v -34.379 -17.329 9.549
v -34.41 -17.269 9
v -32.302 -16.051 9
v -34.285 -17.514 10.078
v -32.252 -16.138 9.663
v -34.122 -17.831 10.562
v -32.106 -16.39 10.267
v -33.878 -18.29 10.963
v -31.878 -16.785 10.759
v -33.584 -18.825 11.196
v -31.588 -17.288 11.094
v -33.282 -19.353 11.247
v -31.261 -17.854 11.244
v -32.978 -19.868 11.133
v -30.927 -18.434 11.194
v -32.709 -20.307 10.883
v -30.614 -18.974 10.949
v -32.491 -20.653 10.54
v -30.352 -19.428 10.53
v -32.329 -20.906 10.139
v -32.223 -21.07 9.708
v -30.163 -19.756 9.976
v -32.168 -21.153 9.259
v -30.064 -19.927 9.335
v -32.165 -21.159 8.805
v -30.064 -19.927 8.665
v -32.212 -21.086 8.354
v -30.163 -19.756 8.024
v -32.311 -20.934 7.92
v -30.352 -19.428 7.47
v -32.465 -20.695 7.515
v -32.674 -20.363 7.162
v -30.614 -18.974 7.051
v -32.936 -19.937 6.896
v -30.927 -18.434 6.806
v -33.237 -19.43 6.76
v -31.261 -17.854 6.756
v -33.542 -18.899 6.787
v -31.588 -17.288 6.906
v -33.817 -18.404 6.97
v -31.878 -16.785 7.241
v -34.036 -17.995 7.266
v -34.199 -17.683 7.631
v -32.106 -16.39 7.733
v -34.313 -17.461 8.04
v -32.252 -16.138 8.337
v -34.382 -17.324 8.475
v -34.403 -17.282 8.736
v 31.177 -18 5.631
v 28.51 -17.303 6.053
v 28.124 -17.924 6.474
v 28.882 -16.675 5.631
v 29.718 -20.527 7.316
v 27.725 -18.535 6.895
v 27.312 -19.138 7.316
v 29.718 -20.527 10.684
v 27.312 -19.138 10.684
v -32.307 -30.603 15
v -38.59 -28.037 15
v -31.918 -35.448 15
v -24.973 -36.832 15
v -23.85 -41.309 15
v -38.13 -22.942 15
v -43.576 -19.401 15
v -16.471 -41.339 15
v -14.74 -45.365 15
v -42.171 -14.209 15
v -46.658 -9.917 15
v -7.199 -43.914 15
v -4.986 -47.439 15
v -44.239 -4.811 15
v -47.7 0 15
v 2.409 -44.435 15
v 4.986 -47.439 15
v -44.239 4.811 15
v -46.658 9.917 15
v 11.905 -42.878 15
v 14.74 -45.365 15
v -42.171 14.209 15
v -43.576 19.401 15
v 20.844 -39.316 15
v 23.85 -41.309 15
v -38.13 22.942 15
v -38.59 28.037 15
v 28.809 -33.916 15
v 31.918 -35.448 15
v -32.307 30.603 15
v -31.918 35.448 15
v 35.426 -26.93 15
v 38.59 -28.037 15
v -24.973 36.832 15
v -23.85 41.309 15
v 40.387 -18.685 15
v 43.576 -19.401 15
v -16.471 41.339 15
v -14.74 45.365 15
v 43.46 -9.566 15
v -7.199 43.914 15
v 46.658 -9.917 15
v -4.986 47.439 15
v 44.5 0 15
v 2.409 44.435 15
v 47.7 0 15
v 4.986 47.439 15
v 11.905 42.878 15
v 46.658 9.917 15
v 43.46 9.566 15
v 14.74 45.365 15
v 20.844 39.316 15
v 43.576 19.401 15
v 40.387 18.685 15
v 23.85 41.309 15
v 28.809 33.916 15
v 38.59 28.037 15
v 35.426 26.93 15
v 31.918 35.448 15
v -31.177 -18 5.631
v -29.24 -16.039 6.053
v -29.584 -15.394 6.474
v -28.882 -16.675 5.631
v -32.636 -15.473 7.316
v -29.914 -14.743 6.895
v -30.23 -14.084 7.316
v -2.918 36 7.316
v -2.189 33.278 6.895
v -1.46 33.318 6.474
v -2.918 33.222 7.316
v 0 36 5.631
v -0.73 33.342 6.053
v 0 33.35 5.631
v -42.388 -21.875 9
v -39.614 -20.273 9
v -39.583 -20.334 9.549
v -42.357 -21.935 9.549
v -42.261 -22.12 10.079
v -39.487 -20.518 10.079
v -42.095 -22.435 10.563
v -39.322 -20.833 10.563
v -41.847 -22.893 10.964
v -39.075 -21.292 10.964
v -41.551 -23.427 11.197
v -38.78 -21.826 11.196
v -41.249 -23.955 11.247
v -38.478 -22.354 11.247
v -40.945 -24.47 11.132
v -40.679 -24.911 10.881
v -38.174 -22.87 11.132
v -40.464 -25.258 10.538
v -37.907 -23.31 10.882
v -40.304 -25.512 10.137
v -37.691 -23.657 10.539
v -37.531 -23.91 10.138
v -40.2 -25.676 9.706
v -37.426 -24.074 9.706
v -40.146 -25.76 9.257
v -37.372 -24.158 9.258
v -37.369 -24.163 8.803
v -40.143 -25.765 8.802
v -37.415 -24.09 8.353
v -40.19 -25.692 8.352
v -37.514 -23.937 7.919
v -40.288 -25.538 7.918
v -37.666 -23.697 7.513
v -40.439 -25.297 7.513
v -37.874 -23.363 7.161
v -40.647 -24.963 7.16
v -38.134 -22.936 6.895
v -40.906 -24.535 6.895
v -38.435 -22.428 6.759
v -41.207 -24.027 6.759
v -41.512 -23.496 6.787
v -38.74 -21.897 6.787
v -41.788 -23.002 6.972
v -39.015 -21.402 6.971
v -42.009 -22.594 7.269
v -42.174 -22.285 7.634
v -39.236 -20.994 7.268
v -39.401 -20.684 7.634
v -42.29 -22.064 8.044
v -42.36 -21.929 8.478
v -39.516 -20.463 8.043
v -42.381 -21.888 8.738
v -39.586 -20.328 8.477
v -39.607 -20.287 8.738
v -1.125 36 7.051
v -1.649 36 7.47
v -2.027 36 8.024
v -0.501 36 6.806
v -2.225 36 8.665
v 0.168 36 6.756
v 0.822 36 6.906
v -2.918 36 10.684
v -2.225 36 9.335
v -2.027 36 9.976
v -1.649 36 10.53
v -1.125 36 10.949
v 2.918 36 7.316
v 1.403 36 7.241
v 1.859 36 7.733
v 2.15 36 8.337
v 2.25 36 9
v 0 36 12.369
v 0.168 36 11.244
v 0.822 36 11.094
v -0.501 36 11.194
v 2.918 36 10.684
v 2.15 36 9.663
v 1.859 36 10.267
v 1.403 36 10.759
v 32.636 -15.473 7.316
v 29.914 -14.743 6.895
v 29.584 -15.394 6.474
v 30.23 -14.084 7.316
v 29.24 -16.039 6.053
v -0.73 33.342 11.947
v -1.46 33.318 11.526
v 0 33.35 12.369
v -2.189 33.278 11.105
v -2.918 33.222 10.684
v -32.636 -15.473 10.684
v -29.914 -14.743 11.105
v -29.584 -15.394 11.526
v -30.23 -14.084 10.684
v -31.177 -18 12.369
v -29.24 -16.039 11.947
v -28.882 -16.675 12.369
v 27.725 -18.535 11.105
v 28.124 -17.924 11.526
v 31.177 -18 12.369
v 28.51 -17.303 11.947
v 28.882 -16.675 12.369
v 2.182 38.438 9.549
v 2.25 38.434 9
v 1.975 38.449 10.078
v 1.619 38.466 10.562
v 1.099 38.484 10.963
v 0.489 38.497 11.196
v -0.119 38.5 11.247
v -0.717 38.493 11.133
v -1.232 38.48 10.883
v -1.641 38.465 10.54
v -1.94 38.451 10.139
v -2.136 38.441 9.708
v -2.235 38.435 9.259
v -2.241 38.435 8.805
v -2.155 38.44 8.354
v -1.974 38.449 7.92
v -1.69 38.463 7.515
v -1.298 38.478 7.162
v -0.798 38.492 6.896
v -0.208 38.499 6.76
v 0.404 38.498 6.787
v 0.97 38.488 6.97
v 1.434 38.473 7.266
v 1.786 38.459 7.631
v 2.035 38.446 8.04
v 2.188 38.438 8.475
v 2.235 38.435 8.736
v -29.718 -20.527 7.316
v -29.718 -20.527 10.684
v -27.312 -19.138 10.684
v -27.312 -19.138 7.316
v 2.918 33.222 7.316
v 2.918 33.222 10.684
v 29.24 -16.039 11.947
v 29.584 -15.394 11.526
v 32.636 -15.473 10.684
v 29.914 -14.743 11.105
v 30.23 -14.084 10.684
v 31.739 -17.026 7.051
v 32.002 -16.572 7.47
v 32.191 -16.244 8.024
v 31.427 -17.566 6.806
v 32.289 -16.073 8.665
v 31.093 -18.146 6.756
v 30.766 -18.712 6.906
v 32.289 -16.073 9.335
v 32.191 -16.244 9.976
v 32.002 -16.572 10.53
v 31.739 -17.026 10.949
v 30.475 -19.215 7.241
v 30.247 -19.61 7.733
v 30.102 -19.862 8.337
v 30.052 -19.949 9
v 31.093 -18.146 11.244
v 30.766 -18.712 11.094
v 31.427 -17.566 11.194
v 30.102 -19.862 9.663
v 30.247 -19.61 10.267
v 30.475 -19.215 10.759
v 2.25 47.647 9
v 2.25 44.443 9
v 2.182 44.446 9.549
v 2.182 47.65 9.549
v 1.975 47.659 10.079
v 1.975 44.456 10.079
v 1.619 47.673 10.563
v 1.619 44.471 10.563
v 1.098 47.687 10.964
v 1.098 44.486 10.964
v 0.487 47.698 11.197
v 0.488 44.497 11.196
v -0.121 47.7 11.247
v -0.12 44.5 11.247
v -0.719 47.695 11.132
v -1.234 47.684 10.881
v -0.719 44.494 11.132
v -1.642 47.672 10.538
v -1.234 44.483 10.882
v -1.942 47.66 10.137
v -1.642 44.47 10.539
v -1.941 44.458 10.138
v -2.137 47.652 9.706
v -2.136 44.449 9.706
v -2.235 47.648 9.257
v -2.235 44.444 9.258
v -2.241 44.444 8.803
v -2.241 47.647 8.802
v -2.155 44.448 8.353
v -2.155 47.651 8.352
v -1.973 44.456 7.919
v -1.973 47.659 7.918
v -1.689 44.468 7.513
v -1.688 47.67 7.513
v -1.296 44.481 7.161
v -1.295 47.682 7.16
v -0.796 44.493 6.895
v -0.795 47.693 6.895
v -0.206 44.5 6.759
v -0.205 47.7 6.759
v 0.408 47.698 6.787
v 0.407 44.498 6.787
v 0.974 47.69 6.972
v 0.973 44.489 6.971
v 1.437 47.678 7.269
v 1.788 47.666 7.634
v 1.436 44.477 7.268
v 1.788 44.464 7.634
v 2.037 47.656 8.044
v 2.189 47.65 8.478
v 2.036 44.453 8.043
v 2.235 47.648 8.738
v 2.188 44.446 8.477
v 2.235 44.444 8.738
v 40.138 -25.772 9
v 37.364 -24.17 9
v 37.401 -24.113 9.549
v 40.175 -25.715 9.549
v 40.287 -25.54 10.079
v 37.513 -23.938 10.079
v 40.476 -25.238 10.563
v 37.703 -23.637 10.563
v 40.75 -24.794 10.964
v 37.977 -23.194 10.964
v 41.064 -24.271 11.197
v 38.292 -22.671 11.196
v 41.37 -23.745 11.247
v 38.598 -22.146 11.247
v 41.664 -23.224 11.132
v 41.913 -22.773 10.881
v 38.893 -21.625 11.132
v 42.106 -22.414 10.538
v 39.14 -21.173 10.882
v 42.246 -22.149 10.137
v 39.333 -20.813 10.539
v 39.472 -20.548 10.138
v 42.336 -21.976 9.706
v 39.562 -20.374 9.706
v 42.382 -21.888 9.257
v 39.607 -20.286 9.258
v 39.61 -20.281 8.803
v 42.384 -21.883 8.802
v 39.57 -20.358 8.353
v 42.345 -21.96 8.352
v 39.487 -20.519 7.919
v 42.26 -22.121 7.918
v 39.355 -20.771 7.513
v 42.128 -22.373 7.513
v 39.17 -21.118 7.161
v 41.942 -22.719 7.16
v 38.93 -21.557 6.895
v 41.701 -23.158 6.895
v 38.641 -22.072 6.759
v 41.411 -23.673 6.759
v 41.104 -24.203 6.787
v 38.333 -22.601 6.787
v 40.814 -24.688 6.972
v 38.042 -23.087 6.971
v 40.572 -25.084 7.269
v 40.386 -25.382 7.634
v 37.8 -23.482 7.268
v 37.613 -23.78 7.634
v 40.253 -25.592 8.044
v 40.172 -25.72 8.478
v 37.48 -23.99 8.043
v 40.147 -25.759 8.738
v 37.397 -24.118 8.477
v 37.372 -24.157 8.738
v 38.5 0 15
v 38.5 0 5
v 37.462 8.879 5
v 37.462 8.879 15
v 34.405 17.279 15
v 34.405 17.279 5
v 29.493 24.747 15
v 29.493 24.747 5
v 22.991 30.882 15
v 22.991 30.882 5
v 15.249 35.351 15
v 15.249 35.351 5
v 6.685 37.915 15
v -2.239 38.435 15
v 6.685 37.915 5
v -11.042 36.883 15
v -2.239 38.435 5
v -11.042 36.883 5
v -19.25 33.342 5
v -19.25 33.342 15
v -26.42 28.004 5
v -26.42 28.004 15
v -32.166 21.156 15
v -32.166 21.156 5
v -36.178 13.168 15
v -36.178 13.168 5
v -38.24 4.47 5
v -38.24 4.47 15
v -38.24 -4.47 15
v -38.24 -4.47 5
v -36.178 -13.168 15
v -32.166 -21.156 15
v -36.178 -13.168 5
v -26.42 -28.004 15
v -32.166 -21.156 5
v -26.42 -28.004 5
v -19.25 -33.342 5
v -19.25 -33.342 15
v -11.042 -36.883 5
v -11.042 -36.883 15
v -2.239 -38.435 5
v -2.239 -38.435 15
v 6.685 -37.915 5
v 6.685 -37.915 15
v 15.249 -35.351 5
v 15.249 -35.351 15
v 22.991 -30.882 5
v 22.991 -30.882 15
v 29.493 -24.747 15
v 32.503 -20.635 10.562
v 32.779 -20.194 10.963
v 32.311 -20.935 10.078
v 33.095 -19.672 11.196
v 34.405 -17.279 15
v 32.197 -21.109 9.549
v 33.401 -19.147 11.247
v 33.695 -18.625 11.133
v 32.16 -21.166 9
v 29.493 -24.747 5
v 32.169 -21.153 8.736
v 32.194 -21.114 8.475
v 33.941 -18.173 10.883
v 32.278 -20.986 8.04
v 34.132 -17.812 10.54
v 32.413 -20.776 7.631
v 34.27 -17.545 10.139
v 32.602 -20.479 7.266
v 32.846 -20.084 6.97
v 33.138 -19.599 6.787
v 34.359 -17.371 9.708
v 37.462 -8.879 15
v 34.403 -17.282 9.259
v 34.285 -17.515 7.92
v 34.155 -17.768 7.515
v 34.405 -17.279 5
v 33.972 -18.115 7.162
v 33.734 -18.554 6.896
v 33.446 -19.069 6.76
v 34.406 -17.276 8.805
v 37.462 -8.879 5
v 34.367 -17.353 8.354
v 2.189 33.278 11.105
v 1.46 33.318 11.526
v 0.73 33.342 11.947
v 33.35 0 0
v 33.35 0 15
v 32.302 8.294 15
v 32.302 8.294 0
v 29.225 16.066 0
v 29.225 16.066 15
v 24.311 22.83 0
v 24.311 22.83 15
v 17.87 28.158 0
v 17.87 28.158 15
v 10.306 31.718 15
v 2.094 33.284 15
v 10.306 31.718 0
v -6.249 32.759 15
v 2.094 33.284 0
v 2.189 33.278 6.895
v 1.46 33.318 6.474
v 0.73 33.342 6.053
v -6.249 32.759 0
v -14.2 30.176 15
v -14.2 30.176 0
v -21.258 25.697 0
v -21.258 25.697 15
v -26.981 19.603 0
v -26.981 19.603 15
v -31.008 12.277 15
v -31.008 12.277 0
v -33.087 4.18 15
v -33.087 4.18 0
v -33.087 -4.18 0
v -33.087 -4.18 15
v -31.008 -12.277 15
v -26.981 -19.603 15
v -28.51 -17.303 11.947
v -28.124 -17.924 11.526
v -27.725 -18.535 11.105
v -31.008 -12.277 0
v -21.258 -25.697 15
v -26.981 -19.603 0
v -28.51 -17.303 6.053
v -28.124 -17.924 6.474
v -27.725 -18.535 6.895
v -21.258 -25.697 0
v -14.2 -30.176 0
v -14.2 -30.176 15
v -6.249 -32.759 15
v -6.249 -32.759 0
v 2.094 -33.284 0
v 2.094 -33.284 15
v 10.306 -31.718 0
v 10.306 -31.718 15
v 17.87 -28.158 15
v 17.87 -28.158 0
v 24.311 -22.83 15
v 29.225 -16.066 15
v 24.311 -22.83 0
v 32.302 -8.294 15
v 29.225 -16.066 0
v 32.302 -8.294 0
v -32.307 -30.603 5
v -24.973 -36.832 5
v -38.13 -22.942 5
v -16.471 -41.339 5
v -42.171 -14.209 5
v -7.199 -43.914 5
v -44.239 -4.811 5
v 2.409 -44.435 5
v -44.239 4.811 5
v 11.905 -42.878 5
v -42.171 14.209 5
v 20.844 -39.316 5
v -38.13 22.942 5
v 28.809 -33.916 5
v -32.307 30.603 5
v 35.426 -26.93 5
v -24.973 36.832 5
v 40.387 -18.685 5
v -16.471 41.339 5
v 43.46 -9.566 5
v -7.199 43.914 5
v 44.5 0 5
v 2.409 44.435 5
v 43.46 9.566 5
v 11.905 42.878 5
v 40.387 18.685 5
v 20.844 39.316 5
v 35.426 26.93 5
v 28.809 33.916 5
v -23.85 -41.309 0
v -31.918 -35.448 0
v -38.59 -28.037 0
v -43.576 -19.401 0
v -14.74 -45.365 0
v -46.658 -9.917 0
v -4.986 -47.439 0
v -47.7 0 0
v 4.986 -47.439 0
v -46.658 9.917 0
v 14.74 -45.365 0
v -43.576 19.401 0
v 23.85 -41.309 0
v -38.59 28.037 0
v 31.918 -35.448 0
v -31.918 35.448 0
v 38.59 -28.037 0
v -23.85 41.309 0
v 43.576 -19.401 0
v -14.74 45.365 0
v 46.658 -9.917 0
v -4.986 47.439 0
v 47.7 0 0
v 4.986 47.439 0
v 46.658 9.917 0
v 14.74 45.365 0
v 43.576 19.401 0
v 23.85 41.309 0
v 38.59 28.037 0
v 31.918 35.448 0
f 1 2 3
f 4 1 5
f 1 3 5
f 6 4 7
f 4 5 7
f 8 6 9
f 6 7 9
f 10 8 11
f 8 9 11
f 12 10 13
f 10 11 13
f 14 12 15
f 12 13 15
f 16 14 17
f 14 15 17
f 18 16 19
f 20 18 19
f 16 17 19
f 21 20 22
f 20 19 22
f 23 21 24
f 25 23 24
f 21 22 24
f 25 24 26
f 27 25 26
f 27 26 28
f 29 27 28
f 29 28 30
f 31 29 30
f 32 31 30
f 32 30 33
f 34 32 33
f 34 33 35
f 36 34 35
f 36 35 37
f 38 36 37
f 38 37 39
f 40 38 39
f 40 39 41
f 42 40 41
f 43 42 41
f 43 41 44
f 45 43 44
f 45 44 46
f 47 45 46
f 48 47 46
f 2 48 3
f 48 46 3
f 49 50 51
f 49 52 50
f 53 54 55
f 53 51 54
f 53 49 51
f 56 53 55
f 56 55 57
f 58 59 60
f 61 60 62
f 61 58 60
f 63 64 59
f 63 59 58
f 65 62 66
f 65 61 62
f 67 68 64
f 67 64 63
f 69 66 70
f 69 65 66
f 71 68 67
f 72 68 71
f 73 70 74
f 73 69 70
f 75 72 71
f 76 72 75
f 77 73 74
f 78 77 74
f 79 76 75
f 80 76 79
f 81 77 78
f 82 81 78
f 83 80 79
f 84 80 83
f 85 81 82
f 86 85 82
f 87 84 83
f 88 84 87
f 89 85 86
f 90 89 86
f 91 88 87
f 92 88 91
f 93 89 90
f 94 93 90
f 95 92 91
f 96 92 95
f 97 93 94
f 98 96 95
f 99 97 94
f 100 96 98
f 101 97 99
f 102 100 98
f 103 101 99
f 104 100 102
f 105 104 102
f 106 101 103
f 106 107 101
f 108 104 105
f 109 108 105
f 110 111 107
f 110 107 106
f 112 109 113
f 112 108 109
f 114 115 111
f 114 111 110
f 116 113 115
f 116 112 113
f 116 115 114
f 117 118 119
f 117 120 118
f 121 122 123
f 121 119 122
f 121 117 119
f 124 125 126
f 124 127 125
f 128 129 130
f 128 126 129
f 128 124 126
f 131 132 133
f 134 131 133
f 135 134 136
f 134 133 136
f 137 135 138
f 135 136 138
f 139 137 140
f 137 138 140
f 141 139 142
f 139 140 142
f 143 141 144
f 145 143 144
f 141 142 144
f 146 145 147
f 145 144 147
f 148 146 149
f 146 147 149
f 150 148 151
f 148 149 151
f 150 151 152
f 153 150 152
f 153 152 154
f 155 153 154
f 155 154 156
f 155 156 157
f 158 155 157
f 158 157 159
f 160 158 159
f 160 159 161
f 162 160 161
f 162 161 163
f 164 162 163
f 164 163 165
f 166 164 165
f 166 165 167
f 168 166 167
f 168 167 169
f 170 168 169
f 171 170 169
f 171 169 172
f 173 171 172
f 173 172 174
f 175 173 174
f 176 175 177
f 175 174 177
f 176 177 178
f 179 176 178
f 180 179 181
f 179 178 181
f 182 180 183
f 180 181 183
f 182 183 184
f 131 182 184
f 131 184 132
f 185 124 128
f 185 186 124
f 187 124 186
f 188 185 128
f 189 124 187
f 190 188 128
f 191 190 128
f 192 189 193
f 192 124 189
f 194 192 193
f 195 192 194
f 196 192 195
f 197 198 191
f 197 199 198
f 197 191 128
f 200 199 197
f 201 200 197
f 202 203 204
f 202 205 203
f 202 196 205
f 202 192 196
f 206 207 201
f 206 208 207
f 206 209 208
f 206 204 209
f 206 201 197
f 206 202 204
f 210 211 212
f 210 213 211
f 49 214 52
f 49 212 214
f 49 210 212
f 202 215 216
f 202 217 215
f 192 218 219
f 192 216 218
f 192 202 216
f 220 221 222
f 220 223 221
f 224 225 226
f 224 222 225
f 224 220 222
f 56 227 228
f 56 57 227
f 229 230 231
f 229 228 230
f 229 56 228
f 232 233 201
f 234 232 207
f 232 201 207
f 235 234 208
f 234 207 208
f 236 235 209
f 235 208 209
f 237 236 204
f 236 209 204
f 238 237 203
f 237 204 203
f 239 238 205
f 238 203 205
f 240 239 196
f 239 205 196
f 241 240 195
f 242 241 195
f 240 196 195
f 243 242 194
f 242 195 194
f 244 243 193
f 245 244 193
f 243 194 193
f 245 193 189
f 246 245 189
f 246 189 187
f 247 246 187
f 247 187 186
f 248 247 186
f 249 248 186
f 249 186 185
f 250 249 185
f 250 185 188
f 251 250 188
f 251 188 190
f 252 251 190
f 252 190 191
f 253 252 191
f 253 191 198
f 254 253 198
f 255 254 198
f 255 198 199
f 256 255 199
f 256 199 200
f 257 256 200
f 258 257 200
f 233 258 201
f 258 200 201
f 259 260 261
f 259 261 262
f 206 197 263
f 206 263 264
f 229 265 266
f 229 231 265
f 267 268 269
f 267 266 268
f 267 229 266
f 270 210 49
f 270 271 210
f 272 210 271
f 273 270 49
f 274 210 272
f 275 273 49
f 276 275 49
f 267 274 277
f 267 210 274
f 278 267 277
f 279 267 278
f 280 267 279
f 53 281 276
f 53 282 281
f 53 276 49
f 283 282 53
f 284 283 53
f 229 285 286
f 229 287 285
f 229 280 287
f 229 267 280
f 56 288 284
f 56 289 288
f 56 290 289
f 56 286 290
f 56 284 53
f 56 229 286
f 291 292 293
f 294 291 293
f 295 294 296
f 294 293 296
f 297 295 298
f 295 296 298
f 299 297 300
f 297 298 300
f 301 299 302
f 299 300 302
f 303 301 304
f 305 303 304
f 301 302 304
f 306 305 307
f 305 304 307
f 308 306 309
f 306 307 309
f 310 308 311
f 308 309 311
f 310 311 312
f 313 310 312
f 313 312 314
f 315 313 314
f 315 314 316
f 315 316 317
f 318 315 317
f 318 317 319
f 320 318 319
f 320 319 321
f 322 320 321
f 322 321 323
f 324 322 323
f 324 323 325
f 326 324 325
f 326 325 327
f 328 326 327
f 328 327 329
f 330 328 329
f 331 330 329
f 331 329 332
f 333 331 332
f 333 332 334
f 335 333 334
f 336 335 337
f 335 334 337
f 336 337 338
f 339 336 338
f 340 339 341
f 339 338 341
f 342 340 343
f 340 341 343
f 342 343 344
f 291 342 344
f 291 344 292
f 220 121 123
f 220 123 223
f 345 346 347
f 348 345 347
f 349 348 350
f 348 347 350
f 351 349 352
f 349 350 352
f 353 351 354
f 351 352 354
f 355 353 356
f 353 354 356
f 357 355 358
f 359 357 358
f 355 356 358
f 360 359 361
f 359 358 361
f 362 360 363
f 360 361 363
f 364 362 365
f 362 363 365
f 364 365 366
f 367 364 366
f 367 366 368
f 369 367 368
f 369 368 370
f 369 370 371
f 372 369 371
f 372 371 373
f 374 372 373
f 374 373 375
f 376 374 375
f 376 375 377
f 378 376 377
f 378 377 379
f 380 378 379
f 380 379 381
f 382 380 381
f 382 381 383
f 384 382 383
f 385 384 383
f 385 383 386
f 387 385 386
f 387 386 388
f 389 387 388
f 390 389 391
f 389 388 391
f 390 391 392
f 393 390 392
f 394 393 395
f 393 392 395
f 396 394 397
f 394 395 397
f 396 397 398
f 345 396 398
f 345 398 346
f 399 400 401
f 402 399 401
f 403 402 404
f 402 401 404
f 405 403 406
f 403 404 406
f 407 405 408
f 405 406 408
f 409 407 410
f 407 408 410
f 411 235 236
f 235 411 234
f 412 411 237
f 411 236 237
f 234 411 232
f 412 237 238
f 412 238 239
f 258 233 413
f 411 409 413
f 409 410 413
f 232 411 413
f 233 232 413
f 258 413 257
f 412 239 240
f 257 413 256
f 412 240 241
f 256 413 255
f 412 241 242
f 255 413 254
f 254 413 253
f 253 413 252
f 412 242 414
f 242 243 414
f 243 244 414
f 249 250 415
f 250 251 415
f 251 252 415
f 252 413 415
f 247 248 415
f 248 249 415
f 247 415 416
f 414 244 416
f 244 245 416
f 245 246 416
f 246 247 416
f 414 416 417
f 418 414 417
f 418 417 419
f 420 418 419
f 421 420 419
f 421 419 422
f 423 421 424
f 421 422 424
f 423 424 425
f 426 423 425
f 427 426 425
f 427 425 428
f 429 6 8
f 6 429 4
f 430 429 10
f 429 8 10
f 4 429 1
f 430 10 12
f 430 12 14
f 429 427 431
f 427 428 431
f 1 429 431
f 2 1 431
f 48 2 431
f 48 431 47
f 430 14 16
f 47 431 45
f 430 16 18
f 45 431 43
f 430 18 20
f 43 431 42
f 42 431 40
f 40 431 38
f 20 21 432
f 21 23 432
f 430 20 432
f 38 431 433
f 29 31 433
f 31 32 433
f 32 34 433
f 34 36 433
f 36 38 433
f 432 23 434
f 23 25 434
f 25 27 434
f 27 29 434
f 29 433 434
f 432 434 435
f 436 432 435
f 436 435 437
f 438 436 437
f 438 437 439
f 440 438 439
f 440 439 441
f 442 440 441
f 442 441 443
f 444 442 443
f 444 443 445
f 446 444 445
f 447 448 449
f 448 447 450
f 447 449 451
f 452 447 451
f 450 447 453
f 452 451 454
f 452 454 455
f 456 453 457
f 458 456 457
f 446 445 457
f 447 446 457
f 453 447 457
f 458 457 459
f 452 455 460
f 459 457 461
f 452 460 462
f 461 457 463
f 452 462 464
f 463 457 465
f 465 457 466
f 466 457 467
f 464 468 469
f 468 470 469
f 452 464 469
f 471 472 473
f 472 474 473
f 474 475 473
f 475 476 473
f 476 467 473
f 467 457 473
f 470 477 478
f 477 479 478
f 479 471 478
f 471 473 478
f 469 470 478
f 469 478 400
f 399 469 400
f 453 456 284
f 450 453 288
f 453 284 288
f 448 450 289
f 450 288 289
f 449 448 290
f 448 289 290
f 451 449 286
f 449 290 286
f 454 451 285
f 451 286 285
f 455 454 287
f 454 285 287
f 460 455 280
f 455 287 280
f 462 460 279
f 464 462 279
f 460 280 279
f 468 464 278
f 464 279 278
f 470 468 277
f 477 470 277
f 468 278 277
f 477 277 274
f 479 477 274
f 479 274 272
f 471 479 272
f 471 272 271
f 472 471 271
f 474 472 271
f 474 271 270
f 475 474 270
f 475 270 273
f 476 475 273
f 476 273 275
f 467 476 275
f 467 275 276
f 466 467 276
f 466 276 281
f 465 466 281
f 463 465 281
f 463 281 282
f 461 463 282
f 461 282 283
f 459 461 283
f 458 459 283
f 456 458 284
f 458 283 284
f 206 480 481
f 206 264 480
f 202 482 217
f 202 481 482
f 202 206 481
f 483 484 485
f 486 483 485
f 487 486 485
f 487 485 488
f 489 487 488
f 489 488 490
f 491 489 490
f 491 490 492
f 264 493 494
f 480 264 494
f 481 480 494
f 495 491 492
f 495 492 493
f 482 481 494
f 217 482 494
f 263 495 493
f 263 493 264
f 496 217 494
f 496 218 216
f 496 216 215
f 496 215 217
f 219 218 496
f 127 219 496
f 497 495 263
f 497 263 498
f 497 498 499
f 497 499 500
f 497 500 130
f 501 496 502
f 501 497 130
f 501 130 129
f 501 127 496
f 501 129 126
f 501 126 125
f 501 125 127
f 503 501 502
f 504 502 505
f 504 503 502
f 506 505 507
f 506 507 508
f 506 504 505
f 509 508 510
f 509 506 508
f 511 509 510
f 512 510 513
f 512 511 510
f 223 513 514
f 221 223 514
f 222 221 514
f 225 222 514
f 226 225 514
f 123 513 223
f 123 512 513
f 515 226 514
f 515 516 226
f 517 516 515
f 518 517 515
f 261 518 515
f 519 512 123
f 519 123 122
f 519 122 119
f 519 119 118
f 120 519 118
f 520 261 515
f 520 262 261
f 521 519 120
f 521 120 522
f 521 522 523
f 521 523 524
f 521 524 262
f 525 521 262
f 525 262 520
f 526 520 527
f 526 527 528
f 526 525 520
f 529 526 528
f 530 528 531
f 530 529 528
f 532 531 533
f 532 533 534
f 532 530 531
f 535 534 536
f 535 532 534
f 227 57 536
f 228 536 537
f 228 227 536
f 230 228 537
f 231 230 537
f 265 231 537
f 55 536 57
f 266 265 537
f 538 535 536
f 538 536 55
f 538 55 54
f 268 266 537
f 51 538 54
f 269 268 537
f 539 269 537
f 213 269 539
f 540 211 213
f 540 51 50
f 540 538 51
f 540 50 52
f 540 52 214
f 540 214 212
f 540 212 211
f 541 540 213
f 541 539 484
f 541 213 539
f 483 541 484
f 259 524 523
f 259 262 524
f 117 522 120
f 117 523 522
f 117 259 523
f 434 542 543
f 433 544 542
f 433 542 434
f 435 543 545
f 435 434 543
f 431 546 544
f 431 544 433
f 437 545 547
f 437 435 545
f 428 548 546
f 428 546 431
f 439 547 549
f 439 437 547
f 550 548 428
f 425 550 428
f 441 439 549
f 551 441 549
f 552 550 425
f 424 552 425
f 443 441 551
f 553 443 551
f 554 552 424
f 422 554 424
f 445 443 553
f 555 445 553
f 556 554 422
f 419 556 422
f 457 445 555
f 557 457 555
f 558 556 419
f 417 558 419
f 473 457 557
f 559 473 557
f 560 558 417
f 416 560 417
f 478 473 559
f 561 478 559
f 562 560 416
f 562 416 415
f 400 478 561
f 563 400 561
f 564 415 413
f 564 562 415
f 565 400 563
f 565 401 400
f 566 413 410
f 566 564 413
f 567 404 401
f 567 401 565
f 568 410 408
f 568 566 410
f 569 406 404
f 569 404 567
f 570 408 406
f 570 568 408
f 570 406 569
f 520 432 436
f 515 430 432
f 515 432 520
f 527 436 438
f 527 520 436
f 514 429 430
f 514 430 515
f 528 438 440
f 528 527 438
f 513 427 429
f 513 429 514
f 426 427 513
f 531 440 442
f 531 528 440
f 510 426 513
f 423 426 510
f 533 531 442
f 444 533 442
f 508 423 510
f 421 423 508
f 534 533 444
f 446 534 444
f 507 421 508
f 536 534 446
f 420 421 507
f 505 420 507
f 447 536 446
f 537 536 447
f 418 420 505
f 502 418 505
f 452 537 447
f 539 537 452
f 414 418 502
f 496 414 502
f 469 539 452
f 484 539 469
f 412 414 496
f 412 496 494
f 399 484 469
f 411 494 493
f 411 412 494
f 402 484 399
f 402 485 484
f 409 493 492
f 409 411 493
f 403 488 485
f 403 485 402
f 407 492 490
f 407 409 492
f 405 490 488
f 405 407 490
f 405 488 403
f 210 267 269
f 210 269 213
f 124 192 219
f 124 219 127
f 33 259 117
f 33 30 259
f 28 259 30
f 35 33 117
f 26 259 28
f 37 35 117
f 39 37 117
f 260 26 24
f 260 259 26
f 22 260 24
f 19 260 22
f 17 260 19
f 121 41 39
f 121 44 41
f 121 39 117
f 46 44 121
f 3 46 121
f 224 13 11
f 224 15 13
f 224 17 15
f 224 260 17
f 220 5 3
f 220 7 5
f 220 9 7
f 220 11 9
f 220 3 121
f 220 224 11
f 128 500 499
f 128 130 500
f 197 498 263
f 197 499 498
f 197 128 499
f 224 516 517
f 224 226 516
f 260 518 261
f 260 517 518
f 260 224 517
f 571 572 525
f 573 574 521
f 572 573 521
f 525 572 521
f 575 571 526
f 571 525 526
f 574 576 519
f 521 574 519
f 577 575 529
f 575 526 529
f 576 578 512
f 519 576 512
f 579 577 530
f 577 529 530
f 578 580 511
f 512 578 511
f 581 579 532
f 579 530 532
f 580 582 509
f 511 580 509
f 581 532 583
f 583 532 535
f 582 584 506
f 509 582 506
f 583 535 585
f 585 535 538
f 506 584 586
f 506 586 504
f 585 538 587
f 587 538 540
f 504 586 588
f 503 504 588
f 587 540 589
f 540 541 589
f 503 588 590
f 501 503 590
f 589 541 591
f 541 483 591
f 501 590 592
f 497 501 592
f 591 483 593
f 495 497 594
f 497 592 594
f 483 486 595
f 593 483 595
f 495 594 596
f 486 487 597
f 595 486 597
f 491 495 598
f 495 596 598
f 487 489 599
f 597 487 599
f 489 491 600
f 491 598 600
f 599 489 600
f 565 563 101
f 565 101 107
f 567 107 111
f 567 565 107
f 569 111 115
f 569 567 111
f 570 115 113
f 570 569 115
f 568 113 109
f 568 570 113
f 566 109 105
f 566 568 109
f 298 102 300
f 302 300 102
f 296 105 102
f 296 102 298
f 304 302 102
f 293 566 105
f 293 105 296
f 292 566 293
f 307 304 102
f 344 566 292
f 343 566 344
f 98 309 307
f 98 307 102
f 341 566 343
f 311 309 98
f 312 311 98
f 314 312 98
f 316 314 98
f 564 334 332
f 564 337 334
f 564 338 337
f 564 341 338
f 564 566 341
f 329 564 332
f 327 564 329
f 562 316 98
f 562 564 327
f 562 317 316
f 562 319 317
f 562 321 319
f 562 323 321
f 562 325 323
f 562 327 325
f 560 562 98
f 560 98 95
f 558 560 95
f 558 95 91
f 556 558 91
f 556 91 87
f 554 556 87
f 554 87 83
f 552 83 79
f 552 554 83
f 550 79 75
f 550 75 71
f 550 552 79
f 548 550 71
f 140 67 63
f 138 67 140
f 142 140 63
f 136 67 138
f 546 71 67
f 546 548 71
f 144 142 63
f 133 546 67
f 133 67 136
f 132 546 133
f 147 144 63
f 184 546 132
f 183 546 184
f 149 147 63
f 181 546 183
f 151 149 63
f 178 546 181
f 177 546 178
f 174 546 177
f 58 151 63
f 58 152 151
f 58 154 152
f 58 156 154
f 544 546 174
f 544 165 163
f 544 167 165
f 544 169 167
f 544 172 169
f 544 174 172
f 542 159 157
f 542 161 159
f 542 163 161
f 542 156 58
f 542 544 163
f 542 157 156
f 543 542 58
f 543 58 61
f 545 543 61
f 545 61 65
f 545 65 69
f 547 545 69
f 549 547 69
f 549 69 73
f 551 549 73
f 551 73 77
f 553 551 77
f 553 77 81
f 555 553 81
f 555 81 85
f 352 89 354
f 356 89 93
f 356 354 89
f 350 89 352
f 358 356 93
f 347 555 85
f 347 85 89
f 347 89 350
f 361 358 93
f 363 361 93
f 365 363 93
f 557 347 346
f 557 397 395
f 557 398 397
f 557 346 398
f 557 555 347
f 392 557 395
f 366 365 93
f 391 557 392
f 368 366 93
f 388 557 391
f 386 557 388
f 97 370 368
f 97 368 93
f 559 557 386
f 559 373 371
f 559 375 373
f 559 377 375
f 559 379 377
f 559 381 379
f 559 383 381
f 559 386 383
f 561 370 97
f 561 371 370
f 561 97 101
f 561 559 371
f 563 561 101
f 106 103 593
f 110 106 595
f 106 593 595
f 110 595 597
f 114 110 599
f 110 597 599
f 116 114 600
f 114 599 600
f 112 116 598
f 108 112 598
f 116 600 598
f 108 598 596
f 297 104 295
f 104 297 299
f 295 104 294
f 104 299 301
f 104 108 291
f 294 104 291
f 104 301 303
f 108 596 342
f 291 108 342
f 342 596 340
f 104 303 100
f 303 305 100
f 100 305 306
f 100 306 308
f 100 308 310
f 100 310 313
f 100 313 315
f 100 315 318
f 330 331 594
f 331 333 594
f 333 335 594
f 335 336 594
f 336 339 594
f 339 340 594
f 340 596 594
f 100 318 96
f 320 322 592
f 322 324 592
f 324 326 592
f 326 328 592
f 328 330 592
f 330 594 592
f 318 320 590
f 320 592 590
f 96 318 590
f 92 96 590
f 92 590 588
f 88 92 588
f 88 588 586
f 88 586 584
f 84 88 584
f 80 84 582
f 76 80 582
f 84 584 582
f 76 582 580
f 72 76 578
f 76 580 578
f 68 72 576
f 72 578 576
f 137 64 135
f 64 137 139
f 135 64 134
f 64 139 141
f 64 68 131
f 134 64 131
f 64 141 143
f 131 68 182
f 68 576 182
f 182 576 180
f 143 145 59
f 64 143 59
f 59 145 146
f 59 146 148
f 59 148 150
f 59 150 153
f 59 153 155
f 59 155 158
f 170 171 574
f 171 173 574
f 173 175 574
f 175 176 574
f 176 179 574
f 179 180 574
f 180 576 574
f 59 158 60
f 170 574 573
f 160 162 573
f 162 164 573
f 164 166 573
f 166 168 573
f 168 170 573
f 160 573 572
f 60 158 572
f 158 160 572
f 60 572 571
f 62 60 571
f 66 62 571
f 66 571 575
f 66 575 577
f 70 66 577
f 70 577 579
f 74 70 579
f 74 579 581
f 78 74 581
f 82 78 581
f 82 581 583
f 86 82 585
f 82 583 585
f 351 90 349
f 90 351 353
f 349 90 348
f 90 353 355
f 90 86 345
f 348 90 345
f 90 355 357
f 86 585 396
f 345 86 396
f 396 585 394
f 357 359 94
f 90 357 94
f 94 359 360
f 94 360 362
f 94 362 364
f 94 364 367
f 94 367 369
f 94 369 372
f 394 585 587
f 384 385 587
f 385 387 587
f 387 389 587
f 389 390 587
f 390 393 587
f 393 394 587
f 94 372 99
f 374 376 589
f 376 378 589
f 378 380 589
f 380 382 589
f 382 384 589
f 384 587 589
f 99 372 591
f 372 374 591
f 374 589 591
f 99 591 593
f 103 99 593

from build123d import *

# Parameters (mm, degrees)
F0_R             = 38.5
F0_R_2           = 33.35
F1_DEPTH         = 15
F2_R             = 44.5
F2_R_2           = 38.5
F3_DEPTH         = 5
F4_R             = 47.7
F4_R_2           = 44.5
F5_DEPTH         = 15
F6_R             = 2.25
F7_DEPTH         = 47.701
F7_COPIES_COUNT  = 3
F10_DEPTH        = 4
F10_COPIES_COUNT = 3


# Not quite as in the source:
# - a pattern or mirror of a feature is missing from the dataset's text; its kind, count and spacing are read off the source's solid


with BuildPart() as f1:
    # F0 (on Top) → F1 (new body)
    with BuildSketch(Plane.XY):
        Circle(F0_R)
        Circle(F0_R_2, mode=Mode.SUBTRACT)
    extrude(amount=F1_DEPTH)

    # F2 (on Top) → F3 (join)
    with BuildSketch(Plane.XY):
        Circle(F2_R)
        Circle(F2_R_2, mode=Mode.SUBTRACT)
    extrude(amount=F3_DEPTH)

    # F4 (on Top) → F5 (join)
    with BuildSketch(Plane.XY):
        Circle(F4_R)
        Circle(F4_R_2, mode=Mode.SUBTRACT)
    extrude(amount=F5_DEPTH)

    # F6 (on Front) → F7 (cut, through all)
    with BuildSketch(Plane.XZ):
        with Locations((0, 9)):
            Circle(F6_R)
    f7 = extrude(amount=-F7_DEPTH, mode=Mode.SUBTRACT)

    # F7_copies: F7 ×3 about axis
    f7_copies_axis = Axis((0, 0, 0), (0, 0, 1))
    for i in range(1, F7_COPIES_COUNT):
        add(f7.rotate(f7_copies_axis, i * 360 / F7_COPIES_COUNT), mode=Mode.SUBTRACT)

    # F9 (on offset) → F10 (cut)
    with BuildSketch(Plane.XZ.offset(-36)):
        Polygon((2.9175, 7.3155805896), (2.9175, 10.6844194104), (0, 12.3688388207), (-2.9175, 10.6844194104), (-2.9175, 7.3155805896), (0, 5.6311611793), align=None)
    f10 = extrude(amount=F10_DEPTH, mode=Mode.SUBTRACT)

    # F10_copies: F10 ×3 about axis
    f10_copies_axis = Axis((0, 0, 0), (0, 0, 1))
    for i in range(1, F10_COPIES_COUNT):
        add(f10.rotate(f10_copies_axis, i * 360 / F10_COPIES_COUNT), mode=Mode.SUBTRACT)


solid = f1.part
